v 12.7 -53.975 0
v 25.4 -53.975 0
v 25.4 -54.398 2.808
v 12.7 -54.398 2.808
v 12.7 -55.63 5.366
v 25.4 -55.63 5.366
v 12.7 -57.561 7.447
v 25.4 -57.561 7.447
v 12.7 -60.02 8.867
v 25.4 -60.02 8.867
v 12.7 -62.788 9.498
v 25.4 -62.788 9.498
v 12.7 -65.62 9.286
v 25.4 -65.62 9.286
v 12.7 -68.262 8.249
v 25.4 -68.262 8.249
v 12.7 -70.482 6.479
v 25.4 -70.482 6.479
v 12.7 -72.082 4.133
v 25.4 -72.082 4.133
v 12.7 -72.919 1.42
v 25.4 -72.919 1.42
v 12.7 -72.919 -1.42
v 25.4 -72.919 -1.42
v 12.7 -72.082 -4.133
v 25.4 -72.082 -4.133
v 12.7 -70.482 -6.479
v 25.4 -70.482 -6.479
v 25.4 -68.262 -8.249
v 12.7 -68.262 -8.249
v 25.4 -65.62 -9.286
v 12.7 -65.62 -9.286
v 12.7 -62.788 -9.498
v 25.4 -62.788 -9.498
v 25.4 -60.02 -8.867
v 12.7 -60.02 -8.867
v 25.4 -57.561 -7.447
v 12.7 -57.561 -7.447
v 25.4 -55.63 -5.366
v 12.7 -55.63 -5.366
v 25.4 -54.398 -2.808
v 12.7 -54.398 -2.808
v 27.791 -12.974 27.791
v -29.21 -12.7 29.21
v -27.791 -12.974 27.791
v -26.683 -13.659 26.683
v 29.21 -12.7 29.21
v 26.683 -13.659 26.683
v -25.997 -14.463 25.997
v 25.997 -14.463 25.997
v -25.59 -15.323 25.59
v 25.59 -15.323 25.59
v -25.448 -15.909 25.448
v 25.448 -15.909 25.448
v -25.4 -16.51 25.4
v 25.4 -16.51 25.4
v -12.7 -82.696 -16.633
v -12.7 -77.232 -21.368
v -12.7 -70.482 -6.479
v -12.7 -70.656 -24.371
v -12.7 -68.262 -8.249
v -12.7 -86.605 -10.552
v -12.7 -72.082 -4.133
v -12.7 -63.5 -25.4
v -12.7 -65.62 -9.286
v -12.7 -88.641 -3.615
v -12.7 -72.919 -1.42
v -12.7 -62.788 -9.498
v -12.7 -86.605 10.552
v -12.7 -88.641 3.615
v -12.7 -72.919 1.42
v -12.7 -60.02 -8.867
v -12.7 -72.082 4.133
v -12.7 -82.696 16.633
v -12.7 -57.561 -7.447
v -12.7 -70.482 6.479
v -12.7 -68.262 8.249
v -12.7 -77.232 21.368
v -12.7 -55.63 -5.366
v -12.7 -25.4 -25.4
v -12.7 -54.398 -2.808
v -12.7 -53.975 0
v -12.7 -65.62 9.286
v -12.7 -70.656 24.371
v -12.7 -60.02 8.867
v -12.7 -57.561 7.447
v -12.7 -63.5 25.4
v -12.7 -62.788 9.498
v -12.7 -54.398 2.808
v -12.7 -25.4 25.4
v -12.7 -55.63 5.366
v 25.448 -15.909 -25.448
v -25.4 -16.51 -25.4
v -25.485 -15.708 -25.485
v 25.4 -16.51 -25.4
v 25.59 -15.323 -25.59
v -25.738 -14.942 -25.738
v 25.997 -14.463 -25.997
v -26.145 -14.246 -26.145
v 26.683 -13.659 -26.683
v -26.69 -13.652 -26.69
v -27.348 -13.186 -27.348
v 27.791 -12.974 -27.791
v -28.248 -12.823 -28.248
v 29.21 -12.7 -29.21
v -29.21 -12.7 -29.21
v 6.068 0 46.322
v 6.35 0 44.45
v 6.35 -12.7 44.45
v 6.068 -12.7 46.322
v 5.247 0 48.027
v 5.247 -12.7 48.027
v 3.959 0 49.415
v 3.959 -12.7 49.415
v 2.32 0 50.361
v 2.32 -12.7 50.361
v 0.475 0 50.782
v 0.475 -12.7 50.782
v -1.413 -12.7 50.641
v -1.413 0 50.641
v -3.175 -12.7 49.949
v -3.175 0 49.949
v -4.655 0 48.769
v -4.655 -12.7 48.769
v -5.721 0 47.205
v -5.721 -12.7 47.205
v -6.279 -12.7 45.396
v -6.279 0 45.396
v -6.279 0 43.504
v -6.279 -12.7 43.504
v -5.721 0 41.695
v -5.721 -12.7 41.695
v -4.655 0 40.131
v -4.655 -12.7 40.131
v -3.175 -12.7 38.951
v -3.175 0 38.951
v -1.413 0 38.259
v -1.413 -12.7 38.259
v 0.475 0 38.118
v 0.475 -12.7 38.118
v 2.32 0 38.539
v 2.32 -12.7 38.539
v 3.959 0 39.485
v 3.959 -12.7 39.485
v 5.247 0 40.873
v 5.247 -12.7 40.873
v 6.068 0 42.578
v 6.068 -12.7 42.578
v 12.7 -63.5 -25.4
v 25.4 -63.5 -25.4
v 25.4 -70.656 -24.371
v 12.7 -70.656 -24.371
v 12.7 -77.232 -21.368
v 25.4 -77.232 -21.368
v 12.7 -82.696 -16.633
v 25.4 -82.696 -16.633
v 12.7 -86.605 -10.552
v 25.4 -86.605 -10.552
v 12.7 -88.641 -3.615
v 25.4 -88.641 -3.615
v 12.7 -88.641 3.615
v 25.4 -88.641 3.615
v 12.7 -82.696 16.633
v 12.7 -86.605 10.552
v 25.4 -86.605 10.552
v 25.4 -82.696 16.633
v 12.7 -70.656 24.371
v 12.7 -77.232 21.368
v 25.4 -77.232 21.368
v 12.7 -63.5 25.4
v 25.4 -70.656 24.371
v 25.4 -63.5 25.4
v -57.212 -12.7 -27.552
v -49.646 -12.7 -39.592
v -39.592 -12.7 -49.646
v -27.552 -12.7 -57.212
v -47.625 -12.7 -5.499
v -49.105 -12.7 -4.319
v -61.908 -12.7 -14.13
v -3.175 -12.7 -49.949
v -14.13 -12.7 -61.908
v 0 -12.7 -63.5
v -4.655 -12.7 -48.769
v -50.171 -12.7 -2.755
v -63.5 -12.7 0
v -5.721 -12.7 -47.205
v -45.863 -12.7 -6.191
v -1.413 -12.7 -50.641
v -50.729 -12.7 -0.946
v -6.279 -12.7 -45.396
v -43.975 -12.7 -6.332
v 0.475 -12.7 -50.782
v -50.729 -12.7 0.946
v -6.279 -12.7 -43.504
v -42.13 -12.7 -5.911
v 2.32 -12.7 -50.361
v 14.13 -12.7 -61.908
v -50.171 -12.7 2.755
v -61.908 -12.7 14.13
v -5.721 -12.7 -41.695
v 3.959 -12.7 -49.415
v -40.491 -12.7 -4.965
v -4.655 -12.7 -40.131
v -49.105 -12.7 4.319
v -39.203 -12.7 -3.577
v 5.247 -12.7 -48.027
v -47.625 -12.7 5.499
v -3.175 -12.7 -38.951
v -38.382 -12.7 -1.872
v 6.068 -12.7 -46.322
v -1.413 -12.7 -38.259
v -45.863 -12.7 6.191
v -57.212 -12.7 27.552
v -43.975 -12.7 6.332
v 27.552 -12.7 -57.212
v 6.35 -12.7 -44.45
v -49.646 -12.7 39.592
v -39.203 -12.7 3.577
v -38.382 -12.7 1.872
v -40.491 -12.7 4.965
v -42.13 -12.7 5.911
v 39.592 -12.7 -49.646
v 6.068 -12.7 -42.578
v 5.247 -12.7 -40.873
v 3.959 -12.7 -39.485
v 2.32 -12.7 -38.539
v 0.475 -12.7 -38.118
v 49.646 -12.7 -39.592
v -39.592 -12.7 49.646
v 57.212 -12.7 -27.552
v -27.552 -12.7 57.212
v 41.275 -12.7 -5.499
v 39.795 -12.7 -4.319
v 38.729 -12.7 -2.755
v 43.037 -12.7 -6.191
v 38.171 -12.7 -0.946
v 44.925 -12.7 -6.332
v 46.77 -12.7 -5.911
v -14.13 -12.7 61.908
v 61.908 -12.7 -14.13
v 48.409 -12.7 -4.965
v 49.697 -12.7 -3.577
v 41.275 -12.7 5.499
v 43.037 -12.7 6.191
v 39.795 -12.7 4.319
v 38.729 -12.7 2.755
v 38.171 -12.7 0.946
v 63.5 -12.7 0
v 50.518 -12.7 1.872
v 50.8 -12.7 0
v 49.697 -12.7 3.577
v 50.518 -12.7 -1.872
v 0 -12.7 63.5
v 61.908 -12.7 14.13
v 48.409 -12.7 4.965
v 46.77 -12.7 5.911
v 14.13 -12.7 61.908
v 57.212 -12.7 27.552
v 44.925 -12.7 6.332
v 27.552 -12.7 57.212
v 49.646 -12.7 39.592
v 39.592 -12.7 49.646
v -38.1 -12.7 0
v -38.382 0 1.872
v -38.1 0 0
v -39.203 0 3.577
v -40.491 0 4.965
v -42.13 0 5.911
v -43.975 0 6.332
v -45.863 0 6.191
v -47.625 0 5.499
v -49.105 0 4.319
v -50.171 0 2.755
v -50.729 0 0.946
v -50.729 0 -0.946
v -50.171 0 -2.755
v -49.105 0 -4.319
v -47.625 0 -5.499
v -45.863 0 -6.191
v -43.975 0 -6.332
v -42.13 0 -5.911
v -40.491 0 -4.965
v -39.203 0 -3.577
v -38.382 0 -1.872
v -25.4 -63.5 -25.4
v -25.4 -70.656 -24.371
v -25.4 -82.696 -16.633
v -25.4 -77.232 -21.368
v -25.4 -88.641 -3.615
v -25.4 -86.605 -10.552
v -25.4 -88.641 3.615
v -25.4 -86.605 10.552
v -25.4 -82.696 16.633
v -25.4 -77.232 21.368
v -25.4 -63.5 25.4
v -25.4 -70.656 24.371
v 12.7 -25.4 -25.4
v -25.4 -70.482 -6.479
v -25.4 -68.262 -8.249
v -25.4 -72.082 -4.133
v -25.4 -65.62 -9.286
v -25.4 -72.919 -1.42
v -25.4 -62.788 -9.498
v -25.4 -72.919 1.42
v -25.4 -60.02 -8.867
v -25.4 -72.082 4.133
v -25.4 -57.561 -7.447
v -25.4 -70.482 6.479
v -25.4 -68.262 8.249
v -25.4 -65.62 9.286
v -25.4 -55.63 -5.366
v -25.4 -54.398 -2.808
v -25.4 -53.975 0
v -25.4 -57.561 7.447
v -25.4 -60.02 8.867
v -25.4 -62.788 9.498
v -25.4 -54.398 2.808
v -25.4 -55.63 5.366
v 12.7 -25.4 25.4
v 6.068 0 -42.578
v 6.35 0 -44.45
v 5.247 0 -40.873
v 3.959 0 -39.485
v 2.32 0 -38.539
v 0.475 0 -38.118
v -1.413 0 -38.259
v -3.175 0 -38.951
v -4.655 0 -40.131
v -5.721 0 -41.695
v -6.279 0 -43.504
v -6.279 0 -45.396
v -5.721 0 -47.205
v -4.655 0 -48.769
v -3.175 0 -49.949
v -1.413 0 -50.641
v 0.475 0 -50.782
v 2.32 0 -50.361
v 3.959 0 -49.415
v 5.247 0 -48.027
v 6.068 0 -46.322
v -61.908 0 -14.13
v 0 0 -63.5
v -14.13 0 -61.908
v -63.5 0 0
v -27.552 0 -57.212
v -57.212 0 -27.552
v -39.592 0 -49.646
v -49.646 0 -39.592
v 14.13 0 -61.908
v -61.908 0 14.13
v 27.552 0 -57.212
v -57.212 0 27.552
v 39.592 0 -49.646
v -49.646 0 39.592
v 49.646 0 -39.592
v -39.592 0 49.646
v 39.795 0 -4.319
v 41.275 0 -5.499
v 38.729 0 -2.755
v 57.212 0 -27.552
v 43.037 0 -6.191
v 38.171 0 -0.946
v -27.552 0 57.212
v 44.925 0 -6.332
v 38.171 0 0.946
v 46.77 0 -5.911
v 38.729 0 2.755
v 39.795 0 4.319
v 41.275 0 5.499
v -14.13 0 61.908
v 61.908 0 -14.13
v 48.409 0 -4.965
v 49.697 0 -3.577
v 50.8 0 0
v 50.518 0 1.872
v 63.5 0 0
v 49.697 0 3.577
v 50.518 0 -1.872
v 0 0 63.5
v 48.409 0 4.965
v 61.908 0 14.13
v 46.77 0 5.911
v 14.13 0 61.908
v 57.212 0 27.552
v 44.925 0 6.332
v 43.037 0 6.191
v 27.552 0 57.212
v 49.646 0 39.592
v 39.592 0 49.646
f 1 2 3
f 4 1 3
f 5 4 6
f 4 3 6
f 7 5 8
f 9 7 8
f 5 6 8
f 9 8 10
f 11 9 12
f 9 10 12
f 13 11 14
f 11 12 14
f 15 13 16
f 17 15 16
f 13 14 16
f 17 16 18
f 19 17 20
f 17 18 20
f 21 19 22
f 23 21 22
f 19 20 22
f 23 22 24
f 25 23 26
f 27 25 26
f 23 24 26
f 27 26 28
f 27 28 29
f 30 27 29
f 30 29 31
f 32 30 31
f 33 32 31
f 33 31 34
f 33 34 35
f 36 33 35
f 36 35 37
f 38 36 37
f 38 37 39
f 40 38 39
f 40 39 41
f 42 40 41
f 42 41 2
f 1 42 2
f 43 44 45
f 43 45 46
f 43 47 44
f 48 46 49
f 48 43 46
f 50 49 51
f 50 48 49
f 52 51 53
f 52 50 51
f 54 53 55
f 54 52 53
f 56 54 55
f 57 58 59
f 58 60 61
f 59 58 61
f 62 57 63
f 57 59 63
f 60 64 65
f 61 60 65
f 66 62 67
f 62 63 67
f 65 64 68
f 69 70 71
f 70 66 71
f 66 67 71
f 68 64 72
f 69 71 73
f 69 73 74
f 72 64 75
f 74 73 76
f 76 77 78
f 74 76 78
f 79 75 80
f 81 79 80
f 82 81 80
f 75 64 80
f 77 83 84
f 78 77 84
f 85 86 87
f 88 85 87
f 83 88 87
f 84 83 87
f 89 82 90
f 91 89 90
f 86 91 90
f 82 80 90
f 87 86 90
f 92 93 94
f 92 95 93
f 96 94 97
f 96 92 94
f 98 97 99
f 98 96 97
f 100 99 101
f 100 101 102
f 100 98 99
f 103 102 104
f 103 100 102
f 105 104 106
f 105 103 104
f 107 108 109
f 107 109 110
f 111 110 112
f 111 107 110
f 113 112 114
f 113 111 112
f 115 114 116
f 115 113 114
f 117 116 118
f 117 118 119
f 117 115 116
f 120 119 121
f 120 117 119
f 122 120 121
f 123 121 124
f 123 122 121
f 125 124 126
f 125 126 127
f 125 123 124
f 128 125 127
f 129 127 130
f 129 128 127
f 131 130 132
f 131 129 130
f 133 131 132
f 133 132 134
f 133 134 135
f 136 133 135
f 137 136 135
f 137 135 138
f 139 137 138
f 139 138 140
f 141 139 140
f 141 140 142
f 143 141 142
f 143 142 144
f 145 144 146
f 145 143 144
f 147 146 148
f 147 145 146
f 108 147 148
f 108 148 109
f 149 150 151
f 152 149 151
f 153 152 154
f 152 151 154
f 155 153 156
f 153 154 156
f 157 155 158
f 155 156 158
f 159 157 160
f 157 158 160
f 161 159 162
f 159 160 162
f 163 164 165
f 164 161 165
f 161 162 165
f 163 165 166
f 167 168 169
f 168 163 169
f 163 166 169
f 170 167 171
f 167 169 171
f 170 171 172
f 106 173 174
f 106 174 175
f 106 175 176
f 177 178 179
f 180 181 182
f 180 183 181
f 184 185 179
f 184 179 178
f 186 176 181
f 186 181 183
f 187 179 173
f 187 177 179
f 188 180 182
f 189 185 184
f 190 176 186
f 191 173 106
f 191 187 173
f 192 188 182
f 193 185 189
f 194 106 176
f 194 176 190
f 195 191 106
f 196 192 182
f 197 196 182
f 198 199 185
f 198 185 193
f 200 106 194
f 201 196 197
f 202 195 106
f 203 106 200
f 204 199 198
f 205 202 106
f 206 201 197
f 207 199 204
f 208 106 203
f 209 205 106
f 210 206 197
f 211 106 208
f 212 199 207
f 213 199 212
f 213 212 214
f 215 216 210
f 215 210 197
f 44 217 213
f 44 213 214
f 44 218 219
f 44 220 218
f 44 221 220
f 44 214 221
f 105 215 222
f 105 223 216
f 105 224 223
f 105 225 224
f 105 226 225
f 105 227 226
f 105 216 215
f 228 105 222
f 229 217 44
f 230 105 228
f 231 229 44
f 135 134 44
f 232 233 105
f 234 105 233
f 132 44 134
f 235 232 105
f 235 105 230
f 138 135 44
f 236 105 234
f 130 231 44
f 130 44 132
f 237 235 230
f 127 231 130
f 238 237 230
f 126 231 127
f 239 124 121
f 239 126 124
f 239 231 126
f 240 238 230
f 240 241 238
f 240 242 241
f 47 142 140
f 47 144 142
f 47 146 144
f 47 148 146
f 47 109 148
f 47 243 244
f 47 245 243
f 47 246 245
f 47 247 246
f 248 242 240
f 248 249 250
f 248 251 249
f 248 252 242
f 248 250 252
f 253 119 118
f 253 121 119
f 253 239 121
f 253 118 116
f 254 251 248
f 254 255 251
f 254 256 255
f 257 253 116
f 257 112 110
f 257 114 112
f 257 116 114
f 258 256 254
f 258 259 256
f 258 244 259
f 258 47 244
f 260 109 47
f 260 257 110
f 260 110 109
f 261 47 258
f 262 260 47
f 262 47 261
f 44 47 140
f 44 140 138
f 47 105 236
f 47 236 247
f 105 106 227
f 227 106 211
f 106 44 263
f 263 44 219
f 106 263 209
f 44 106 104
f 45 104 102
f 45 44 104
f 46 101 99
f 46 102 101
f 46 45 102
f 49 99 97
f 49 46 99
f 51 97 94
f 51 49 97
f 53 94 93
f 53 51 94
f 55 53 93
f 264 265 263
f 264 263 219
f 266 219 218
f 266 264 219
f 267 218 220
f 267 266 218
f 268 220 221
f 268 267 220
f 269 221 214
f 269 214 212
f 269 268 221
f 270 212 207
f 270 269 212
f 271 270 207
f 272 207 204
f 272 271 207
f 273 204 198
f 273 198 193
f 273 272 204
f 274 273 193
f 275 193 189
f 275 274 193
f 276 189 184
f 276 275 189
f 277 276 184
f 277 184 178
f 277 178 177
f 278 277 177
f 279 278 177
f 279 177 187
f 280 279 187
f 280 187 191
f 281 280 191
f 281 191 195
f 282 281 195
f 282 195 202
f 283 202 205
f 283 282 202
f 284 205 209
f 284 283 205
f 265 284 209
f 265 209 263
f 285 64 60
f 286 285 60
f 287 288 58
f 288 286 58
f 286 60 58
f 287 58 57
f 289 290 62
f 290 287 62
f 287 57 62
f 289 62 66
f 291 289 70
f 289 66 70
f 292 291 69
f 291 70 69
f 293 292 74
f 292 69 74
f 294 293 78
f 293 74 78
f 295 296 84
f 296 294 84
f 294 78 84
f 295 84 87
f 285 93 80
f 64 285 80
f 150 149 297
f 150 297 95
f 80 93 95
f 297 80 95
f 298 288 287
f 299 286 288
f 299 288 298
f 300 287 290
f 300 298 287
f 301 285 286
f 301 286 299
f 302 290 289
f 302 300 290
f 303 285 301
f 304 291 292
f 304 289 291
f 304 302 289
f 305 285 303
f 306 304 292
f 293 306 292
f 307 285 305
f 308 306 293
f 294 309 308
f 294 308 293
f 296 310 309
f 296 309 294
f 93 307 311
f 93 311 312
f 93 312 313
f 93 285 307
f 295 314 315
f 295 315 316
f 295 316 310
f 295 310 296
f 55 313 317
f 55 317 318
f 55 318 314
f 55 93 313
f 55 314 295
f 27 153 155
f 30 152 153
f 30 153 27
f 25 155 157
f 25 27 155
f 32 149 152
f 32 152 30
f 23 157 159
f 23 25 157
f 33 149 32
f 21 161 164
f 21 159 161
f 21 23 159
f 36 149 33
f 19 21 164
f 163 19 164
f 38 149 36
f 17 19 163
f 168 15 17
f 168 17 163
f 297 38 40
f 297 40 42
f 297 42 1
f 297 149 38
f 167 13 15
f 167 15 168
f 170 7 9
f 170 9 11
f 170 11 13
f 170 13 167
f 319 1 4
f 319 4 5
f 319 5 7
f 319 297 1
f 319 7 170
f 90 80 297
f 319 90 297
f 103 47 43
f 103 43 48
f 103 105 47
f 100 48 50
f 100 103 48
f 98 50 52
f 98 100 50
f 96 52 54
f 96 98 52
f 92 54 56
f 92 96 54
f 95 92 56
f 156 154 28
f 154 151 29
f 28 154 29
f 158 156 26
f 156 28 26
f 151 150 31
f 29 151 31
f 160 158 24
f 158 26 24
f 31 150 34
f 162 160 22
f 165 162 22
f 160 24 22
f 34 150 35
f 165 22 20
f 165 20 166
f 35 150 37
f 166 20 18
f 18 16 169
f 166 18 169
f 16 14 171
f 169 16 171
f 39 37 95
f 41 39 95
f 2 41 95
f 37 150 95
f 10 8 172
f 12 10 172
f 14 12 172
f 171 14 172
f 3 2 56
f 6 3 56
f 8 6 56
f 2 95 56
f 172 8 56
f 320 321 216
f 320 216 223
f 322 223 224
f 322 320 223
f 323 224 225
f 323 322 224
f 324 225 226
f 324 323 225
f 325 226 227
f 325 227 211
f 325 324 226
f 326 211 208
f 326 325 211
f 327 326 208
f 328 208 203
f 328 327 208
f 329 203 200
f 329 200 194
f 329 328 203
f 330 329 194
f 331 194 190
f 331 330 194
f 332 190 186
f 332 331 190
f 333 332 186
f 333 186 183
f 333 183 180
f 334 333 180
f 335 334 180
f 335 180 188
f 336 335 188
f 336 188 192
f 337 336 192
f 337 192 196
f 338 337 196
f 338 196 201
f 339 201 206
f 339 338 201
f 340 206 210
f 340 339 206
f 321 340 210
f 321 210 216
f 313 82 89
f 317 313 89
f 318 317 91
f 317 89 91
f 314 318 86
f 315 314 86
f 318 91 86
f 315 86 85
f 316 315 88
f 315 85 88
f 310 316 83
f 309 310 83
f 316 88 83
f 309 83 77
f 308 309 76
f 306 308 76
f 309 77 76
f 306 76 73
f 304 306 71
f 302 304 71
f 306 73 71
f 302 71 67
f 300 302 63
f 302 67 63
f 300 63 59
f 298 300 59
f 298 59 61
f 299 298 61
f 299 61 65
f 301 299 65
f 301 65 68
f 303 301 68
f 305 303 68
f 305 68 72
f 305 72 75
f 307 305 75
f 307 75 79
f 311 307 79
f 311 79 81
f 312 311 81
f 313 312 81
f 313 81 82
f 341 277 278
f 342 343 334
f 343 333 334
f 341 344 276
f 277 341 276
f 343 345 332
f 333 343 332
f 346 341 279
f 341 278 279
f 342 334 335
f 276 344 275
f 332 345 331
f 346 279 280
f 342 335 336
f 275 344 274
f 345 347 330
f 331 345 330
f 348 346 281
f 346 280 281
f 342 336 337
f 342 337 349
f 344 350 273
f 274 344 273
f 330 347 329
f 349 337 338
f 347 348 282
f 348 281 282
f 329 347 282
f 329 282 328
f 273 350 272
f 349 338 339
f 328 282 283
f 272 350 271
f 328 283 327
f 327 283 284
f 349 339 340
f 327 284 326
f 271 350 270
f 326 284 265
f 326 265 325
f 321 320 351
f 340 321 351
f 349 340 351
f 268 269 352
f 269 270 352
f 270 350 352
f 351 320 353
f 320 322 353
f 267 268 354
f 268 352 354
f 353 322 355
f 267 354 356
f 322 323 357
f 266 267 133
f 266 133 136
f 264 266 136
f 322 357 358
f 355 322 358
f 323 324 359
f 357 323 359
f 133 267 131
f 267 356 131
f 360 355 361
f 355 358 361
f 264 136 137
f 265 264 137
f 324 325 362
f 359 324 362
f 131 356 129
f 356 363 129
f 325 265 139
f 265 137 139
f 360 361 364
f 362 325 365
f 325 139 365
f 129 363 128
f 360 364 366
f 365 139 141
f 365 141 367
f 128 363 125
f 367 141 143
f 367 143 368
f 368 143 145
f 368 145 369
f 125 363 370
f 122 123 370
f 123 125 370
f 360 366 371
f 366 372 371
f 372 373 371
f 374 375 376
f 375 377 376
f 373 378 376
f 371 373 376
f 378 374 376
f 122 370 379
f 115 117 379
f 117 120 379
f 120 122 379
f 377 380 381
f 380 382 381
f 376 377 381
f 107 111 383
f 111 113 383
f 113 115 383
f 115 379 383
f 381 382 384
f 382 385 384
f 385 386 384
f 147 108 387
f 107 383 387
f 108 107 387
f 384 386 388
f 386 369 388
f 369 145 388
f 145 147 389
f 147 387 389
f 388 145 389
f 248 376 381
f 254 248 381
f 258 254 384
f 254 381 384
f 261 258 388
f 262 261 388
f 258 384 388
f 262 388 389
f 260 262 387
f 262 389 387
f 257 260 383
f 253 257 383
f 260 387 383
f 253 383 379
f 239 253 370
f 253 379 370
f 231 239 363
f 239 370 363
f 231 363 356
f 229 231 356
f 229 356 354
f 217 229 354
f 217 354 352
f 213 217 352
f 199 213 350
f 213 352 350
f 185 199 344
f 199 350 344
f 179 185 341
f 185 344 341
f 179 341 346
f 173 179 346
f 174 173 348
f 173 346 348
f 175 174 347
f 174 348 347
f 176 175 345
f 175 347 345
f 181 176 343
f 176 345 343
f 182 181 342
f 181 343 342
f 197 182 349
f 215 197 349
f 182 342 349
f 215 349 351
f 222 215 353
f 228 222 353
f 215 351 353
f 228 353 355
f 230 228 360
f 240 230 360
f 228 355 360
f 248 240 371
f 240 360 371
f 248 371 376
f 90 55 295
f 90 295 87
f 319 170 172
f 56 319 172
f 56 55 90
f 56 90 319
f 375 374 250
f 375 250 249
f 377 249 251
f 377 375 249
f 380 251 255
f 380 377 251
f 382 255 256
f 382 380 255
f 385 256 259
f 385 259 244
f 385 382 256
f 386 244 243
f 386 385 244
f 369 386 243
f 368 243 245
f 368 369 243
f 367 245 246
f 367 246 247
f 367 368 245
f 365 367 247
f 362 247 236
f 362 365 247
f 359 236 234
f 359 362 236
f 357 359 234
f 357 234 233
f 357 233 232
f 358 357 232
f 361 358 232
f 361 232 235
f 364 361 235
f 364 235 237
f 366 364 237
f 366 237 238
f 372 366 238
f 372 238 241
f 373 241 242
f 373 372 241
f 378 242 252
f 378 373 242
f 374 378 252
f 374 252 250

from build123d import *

# Parameters (mm, degrees)
F0_R     = 63.5
F0_R_2   = 6.35
F1_DEPTH = 12.7
F0_W     = 12.7
F0_H     = 50.8
F2_DEPTH = 127
F0_W_2   = 25.4
F3_DEPTH = 25.4
F4_R     = 9.525
F5_DEPTH = 254
F6_R     = 3.81


with BuildPart() as f1:
    # F0 (on Front) → F1 (new body)
    with BuildSketch(Plane.XZ):
        Circle(F0_R)
        with Locations((0, -44.45)):
            Circle(F0_R_2, mode=Mode.SUBTRACT)
        with Locations((-44.45, 0)):
            Circle(F0_R_2, mode=Mode.SUBTRACT)
        Polygon((-25.4, -25.4), (-25.4, 25.4), (-12.7, 25.4), (12.7, 25.4), (25.4, 25.4), (25.4, -25.4), (12.7, -25.4), (-12.7, -25.4), align=None, mode=Mode.SUBTRACT)
        with Locations((44.45, 0)):
            Circle(F0_R_2, mode=Mode.SUBTRACT)
        with Locations((0, 44.45)):
            Circle(F0_R_2, mode=Mode.SUBTRACT)
    extrude(amount=F1_DEPTH)

    # F0 (on Front) → F2 (join)
    with BuildSketch(Plane.XZ):
        with Locations((-19.05, 0)):
            Rectangle(F0_W, F0_H)
        with Locations((19.05, 0)):
            Rectangle(F0_W, F0_H)
    extrude(amount=F2_DEPTH)

    # F0 (on Front) → F3 (join)
    with BuildSketch(Plane.XZ):
        Rectangle(F0_W_2, F0_H)
    extrude(amount=F3_DEPTH)

    # F4 (on face) → F5 (cut)
    with BuildSketch(Plane.YZ.offset(25.4)):
        with BuildLine():
            Line((-127, -25.4), (-63.5, -25.4))
            ThreePointArc((-63.5, -25.4), (-88.9, 0), (-63.5, 25.4))
            Line((-63.5, 25.4), (-127, 25.4))
            Line((-127, 25.4), (-127, -25.4))
        make_face()
        with Locations((-63.5, 0)):
            Circle(F4_R)
    extrude(amount=-F5_DEPTH, mode=Mode.SUBTRACT)

    # F6
    f6_edges = [f1.edges().sort_by_distance(p)[0] for p in [
        (0, -12.7, 25.4),
        (25.4, -12.7, 0),
        (0, -12.7, -25.4),
        (-25.4, -12.7, 0),
    ]]
    fillet(f6_edges, radius=F6_R)


solid = f1.part
